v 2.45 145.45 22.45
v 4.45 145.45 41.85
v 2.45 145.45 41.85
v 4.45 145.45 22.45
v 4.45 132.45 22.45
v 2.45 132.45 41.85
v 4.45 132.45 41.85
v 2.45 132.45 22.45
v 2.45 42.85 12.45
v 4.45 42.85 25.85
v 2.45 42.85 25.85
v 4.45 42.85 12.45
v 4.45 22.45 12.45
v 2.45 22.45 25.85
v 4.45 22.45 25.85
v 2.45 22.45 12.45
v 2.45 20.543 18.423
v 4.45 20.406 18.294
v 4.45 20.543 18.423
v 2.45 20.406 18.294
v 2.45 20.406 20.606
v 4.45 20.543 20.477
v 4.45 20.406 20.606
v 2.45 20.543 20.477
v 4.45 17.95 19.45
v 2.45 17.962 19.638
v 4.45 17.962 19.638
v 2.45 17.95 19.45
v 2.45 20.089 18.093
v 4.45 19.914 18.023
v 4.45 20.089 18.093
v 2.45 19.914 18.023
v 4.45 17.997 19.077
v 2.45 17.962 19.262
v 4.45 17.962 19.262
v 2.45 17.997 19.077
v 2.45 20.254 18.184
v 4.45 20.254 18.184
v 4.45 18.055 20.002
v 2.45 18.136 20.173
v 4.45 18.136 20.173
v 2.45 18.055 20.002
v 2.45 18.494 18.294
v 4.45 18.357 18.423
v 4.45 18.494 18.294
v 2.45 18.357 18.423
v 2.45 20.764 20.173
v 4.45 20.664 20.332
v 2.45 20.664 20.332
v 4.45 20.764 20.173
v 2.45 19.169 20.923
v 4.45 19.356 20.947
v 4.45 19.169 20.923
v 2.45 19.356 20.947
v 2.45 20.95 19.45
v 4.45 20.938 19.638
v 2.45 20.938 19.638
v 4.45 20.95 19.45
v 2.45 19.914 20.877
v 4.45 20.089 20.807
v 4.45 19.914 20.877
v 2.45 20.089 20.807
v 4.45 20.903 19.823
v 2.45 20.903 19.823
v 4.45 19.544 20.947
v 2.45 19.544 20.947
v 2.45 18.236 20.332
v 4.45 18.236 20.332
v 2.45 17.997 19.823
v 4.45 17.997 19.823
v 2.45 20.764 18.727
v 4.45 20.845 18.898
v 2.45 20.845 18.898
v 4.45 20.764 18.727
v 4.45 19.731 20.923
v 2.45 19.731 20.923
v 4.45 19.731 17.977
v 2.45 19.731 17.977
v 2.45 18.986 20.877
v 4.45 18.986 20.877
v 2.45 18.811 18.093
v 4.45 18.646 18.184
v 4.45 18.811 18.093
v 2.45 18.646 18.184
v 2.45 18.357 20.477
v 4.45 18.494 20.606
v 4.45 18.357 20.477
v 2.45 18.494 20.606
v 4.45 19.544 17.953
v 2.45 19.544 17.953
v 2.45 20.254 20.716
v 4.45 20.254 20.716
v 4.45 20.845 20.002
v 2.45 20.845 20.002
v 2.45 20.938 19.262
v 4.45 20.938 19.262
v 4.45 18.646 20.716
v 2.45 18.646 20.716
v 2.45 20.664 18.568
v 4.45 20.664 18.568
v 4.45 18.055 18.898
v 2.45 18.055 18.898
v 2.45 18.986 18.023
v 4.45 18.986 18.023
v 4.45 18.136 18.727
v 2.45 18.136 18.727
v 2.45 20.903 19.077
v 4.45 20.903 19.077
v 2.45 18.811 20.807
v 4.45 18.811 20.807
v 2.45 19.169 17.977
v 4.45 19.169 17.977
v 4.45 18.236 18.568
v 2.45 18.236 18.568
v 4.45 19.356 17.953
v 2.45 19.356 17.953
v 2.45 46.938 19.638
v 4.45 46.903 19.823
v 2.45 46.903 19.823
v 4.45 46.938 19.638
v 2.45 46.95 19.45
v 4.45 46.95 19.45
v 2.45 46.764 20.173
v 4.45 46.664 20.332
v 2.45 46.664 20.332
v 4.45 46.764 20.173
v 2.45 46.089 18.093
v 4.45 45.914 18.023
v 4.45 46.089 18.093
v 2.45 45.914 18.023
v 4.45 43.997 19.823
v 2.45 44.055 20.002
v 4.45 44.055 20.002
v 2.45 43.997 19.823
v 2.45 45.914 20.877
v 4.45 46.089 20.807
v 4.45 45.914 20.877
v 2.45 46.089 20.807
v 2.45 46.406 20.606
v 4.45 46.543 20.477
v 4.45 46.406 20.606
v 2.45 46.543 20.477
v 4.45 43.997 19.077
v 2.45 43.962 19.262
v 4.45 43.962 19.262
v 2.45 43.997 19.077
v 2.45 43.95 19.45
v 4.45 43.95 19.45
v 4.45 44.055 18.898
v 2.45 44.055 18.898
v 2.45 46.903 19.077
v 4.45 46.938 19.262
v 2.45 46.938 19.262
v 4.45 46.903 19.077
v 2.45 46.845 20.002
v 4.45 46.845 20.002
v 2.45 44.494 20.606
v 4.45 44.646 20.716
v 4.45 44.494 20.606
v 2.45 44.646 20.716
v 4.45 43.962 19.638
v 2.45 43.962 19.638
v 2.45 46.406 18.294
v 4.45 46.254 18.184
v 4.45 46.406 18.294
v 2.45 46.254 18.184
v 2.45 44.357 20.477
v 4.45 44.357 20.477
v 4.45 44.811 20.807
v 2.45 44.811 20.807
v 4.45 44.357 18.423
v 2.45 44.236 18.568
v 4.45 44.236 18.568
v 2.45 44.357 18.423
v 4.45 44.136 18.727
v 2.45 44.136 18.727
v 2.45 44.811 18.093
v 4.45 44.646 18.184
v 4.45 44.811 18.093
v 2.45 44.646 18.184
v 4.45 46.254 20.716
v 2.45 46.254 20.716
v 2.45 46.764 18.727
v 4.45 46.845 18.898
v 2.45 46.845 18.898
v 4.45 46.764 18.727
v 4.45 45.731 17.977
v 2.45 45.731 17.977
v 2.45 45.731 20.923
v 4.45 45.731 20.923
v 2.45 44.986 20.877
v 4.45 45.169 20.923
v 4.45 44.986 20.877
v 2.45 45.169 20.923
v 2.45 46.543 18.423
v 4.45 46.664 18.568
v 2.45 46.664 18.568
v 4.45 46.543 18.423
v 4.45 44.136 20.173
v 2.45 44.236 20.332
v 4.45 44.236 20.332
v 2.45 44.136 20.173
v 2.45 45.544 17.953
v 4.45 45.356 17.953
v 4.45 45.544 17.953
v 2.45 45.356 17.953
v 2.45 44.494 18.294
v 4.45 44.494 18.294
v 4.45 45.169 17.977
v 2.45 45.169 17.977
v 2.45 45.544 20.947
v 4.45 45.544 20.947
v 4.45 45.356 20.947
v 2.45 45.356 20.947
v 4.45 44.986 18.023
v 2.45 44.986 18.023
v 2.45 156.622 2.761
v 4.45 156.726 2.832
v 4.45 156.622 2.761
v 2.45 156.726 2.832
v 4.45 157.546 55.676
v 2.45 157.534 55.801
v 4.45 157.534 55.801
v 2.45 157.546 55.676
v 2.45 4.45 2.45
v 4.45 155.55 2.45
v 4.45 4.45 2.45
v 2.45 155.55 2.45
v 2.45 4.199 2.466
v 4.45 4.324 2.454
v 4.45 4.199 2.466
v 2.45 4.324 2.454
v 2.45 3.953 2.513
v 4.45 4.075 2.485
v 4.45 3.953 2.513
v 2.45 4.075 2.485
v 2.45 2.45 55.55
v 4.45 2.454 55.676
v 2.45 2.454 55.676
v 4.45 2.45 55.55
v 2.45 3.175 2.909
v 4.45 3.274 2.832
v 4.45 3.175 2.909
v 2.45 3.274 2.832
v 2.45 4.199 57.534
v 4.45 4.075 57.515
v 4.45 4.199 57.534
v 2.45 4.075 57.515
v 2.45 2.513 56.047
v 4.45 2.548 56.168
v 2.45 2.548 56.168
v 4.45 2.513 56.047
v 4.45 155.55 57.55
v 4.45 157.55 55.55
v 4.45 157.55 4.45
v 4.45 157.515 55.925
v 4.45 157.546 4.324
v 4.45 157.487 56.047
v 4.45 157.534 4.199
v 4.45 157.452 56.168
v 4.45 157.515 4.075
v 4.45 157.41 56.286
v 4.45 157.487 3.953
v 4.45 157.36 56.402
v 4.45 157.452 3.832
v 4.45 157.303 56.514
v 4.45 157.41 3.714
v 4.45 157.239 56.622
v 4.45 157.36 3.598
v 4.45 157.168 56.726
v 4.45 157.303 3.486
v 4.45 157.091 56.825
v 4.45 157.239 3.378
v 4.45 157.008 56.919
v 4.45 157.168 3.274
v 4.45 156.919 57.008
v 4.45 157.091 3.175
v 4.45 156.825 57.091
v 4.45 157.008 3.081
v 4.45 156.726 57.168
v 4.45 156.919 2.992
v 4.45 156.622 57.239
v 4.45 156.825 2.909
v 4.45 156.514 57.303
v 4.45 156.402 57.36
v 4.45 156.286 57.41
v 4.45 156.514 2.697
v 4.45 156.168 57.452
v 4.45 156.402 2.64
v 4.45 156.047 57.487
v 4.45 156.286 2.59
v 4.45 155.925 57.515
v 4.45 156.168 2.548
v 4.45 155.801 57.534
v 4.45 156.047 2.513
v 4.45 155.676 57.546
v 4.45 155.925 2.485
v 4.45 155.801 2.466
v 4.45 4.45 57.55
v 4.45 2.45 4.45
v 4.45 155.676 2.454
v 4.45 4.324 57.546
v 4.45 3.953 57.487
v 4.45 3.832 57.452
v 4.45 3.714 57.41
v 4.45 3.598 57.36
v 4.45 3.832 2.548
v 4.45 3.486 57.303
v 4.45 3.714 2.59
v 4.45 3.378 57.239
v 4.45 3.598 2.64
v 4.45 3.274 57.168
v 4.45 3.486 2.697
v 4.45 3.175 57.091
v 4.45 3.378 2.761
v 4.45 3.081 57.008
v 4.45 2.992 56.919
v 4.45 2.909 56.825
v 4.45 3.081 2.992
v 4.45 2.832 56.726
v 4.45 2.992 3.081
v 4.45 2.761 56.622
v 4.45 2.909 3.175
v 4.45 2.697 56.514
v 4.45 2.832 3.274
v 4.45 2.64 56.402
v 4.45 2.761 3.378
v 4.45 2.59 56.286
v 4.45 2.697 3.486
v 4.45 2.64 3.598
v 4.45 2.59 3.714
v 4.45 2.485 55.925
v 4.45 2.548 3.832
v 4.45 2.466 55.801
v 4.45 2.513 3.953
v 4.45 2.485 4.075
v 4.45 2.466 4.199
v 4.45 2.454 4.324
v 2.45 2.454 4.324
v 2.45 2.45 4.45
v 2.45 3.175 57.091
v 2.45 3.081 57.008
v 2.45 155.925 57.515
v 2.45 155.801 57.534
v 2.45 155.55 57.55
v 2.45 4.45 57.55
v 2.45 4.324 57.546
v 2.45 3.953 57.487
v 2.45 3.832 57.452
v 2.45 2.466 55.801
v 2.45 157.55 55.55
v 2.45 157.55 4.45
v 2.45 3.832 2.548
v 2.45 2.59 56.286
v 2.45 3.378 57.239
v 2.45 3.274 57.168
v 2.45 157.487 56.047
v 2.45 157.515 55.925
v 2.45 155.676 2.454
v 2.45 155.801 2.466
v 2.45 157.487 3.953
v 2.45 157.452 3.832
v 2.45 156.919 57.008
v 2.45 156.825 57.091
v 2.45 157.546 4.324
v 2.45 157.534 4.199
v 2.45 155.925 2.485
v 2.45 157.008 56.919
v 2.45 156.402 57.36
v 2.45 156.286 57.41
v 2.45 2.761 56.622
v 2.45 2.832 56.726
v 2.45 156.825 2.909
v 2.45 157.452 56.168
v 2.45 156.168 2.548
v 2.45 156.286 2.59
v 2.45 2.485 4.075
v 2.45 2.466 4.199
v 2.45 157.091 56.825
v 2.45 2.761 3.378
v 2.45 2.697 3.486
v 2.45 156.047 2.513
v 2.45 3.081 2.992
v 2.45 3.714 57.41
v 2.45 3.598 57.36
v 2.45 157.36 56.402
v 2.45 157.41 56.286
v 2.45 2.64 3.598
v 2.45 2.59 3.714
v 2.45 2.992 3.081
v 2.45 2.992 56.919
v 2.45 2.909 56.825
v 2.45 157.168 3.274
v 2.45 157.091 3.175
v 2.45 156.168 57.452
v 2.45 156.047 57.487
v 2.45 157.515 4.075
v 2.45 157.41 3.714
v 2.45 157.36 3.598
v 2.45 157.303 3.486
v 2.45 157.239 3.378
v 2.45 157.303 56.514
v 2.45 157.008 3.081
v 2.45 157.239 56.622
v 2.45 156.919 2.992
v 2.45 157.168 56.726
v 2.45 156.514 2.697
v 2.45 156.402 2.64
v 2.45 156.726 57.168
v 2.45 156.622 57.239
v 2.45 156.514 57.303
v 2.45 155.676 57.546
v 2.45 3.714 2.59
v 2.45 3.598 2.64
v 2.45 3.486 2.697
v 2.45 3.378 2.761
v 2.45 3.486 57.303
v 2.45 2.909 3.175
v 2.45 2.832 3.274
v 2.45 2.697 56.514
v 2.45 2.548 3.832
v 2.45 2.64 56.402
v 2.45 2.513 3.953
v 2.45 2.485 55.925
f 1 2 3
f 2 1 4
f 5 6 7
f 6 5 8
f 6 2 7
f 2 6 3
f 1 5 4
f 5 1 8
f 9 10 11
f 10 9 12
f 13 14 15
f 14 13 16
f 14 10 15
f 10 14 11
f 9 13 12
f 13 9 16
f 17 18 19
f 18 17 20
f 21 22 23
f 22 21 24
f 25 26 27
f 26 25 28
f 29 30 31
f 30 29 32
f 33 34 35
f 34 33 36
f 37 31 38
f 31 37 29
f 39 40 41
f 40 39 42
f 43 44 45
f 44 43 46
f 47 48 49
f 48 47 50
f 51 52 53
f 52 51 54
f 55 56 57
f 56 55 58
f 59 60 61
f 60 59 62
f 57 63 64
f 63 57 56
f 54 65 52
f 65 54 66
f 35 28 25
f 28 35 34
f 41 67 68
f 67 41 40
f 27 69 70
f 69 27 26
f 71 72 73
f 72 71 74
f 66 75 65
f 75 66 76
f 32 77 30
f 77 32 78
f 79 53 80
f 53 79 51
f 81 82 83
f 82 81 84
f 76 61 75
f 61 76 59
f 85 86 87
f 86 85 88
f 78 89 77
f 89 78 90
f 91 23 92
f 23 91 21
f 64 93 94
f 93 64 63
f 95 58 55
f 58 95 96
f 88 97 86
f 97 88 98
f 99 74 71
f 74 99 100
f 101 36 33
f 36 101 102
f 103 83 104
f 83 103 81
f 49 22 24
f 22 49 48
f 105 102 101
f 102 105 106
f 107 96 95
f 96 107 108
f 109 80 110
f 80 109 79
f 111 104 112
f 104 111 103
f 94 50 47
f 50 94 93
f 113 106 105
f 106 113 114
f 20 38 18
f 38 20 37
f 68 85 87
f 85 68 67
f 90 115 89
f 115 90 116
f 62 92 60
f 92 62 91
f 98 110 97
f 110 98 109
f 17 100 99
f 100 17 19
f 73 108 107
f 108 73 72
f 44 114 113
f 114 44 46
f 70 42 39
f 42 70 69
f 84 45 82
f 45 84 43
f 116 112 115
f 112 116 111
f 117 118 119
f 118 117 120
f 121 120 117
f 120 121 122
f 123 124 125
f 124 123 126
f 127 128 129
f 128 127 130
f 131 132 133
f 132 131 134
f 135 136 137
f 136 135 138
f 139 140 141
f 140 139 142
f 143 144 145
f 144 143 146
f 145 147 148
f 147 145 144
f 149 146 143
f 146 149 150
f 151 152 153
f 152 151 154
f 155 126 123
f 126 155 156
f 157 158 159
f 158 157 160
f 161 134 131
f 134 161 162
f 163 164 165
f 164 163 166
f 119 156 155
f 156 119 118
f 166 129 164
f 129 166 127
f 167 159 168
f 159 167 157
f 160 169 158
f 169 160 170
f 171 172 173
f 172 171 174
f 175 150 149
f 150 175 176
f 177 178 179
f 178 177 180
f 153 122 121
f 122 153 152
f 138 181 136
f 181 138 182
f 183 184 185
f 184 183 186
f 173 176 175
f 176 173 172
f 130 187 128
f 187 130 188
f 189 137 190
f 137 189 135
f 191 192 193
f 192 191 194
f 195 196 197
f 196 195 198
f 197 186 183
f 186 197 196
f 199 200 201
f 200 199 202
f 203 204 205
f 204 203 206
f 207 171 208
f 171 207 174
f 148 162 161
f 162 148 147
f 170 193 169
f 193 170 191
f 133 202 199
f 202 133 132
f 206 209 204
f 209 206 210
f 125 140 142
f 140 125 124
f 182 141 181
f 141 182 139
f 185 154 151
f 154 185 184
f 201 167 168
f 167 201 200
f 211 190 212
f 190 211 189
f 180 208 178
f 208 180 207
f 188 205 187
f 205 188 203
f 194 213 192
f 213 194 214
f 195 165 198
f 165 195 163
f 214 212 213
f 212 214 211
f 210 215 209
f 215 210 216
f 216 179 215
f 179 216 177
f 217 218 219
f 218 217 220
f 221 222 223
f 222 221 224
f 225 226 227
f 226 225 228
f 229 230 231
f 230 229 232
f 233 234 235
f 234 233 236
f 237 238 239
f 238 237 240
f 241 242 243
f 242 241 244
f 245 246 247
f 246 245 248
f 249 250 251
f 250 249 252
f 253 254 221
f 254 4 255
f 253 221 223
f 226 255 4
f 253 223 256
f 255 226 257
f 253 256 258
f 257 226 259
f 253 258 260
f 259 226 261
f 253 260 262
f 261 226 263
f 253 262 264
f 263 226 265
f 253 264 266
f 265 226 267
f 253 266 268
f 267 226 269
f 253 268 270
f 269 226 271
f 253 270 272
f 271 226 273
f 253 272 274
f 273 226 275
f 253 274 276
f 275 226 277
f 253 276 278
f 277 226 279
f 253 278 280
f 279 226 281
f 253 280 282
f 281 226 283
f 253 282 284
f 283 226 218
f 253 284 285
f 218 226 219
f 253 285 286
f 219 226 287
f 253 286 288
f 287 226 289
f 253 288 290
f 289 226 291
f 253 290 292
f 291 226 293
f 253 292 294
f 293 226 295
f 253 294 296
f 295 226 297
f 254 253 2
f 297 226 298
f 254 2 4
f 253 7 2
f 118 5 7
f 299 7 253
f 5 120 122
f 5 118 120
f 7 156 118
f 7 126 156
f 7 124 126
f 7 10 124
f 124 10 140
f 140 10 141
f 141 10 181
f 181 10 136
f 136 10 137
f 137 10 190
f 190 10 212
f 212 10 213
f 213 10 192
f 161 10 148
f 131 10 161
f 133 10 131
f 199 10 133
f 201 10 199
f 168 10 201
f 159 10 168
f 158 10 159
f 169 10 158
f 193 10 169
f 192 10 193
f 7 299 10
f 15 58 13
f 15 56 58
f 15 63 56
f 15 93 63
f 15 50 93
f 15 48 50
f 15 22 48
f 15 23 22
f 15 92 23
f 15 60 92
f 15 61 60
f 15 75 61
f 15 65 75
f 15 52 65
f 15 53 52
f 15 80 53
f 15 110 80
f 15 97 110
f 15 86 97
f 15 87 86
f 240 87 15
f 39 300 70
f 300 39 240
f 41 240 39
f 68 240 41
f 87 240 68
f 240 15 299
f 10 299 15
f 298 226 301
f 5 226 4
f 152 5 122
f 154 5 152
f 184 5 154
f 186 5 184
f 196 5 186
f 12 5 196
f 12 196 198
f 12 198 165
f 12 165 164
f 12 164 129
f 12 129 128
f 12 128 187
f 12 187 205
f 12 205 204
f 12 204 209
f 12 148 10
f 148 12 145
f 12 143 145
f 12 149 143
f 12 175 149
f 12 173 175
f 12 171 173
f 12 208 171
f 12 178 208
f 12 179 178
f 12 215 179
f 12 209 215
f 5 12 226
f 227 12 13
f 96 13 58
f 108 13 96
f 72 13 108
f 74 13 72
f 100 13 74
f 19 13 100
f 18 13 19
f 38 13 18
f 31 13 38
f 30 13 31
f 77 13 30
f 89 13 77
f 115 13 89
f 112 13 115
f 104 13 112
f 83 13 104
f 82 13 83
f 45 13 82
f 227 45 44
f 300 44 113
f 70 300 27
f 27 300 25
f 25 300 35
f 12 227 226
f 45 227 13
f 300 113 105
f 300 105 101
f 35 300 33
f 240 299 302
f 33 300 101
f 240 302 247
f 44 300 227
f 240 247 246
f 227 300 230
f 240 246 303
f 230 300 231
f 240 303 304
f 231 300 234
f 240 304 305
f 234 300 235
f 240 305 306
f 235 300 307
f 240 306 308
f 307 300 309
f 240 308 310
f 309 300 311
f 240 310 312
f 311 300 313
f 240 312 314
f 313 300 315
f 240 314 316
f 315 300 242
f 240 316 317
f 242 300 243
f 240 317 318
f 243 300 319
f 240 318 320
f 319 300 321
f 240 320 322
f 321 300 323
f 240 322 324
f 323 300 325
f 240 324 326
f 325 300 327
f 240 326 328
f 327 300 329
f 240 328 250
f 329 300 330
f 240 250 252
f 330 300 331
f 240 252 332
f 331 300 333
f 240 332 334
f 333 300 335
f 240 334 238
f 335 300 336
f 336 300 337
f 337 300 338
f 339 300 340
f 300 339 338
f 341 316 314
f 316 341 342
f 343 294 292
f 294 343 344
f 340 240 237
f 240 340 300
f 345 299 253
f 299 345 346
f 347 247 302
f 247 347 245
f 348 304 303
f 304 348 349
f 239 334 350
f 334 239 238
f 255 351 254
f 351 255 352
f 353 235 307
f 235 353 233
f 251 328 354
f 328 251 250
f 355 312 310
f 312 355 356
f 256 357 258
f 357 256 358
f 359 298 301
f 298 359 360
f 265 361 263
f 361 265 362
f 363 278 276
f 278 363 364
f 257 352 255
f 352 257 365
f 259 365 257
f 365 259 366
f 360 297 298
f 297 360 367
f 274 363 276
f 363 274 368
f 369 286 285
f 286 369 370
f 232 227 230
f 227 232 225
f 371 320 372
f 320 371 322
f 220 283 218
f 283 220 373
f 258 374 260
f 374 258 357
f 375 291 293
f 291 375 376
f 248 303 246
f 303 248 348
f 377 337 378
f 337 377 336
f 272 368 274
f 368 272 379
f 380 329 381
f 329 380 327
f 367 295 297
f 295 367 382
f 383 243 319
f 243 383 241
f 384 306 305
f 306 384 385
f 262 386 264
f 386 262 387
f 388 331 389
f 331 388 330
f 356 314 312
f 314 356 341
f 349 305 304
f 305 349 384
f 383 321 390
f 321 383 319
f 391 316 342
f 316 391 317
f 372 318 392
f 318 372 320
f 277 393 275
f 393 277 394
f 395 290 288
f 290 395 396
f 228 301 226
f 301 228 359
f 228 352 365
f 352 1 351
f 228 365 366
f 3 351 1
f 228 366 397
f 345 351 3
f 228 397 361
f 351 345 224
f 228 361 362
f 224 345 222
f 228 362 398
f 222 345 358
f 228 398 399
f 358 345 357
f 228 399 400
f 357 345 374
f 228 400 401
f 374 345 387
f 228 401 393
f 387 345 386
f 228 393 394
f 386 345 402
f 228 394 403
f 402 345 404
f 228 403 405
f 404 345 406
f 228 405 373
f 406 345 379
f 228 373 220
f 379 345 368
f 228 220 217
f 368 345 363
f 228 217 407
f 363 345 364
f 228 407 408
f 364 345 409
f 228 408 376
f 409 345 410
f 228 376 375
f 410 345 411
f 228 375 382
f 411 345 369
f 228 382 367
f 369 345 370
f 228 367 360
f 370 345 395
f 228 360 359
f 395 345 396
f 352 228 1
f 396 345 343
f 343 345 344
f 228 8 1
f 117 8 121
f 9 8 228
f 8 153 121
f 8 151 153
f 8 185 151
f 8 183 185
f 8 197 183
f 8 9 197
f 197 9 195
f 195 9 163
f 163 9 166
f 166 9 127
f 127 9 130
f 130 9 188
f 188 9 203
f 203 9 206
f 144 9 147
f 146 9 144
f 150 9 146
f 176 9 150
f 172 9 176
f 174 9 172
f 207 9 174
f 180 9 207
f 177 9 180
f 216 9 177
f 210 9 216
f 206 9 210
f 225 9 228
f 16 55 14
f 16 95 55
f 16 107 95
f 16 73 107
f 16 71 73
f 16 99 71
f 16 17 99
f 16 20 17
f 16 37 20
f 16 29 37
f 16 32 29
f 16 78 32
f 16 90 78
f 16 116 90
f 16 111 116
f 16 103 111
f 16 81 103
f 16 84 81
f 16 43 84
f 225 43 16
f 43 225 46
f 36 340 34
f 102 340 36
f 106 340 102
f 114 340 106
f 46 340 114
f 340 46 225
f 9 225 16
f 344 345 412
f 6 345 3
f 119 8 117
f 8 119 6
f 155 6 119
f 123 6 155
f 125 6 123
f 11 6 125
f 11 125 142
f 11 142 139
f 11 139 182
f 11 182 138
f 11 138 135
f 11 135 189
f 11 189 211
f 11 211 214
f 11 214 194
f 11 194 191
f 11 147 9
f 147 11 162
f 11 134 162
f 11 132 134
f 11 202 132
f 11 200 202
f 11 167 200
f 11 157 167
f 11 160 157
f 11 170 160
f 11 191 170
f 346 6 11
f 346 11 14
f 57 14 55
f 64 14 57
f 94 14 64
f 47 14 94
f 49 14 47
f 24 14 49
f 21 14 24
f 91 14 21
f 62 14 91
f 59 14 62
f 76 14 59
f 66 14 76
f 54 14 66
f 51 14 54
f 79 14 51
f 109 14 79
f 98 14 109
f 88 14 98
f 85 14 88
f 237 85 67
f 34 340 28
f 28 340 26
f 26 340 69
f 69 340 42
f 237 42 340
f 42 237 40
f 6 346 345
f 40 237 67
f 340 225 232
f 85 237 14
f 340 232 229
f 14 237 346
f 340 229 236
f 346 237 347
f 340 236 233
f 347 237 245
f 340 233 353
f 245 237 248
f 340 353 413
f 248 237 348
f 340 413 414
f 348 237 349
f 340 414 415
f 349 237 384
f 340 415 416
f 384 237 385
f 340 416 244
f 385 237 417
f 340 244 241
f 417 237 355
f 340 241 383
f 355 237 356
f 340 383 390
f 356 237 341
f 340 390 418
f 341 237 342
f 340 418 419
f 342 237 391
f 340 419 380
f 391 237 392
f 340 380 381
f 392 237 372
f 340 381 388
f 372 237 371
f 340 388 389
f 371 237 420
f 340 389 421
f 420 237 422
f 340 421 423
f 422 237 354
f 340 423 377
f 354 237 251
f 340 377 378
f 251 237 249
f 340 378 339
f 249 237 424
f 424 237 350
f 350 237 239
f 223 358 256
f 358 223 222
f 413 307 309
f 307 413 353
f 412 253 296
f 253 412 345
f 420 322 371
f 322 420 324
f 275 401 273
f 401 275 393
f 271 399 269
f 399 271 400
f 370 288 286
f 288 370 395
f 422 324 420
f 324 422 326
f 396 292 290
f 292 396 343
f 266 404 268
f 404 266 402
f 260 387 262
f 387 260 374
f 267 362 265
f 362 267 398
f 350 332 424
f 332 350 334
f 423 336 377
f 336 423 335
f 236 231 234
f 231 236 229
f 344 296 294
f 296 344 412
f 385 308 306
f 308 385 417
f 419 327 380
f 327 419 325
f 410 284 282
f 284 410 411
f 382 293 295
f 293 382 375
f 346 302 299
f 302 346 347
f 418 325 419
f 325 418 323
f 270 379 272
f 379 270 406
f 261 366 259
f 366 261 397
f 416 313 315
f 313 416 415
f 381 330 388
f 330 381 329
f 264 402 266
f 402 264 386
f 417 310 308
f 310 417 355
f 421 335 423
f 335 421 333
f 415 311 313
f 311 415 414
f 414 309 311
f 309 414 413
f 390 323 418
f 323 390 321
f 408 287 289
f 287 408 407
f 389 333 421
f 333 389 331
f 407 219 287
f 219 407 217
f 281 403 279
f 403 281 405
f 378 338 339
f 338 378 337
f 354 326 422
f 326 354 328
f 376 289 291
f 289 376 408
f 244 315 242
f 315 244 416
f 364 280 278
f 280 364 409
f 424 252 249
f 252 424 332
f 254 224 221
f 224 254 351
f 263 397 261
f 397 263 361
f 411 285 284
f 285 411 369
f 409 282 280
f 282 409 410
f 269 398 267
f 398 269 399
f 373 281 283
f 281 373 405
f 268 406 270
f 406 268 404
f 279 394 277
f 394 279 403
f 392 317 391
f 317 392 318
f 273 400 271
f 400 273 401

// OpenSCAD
/*//////////////////////////////////////////////////////////////////
              -    FB Aka Heartman/Hearty 2016     -                   
              -   http://heartygfx.blogspot.com    -                  
              -       OpenScad Parametric Box      -                     
              -         CC BY-NC 3.0 License       -                      
////////////////////////////////////////////////////////////////////                                                                                                             
12/02/2016 - Fixed minor bug 
28/02/2016 - Added holes ventilation option                    
09/03/2016 - Added PCB feet support, fixed the shell artefact on export mode. 

*/////////////////////////// - Info - //////////////////////////////

// All coordinates are starting as integrated circuit pins.
// From the top view :

//   CoordD           <---       CoordC
//                                 ^
//                                 ^
//                                 ^
//   CoordA           --->       CoordB


////////////////////////////////////////////////////////////////////


////////// - Paramètres de la boite - Box parameters - /////////////

/* [Box dimensions] */
// - Longueur - Length  
  Length        = 140;       
// - Largeur - Width
  Width         = 160;                     
// - Hauteur - Height  
  Height        = 60;  
// - Epaisseur - Wall thickness  
  Thick         = 2;//[2:5]  
  
/* [Box options] */
// - Diamètre Coin arrondi - Filet diameter  
  Filet         = 2;//[0.1:12] 
// - lissage de l'arrondi - Filet smoothness  
  Resolution    = 50;//[1:100] 
// - Tolérance - Tolerance (Panel/rails gap)
  m             = 0.9;
// Pieds PCB - PCB feet (x4) 
  PCBFeet       = 0;// [0:No, 1:Yes]
// - Decorations to ventilation holes
  Vent          = 1;// [0:No, 1:Yes]
// - Decoration-Holes width (in mm)
  Vent_width    = 1.5;   


  
/* [PCB_Feet] */
//All dimensions are from the center foot axis

// - Coin bas gauche - Low left corner X position
PCBPosX         = 5;
// - Coin bas gauche - Low left corner Y position
PCBPosY         = 5;
// - Longueur PCB - PCB Length
PCBLength       = 105;
// - Largeur PCB - PCB Width
PCBWidth        = 125;
// - Heuteur pied - Feet height
FootHeight      = 10;
// - Diamètre pied - Foot diameter
FootDia         = 8;
// - Diamètre trou - Hole diameter
FootHole        = 3;  
  

/* [STL element to export] */
//Coque haut - Top shell
TShell          = 0;// [0:No, 1:Yes]
//Coque bas- Bottom shell
BShell          = 0;// [0:No, 1:Yes]
//Panneau avant - Front panel
FPanL           = 0;// [0:No, 1:Yes]
//Panneau arrière - Back panel  
BPanL           = 1;// [0:No, 1:Yes]


  
/* [Hidden] */
// - Couleur coque - Shell color  
Couleur1        = "Orange";       
// - Couleur panneaux - Panels color    
Couleur2        = "OrangeRed";    
// Thick X 2 - making decorations thicker if it is a vent to make sure they go through shell
Dec_Thick       = Vent ? Thick*2 : Thick; 
// - Depth decoration
Dec_size        = Vent ? Thick*2 : 0.8;





/////////// - Boitier générique bord arrondis - Generic rounded box - //////////

module RoundBox($a=Length, $b=Width, $c=Height){// Cube bords arrondis
                    $fn=Resolution;            
                    translate([0,Filet,Filet]){  
                    minkowski (){                                              
                        cube ([$a-(Length/2),$b-(2*Filet),$c-(2*Filet)], center = false);
                        rotate([0,90,0]){    
                        cylinder(r=Filet,h=Length/2, center = false);
                            } 
                        }
                    }
                }// End of RoundBox Module

      
////////////////////////////////// - Module Coque/Shell - //////////////////////////////////         

module Coque(){//Coque - Shell  
    Thick = Thick*2;  
    difference(){    
        difference(){//sides decoration
            union(){    
                     difference() {//soustraction de la forme centrale - Substraction Fileted box
                      
                        difference(){//soustraction cube median - Median cube slicer
                            union() {//union               
                            difference(){//Coque    
                                RoundBox();
                                translate([Thick/2,Thick/2,Thick/2]){     
                                        RoundBox($a=Length-Thick, $b=Width-Thick, $c=Height-Thick);
                                        }
                                        }//Fin diff Coque                            
                                difference(){//largeur Rails        
                                     translate([Thick+m,Thick/2,Thick/2]){// Rails
                                          RoundBox($a=Length-((2*Thick)+(2*m)), $b=Width-Thick, $c=Height-(Thick*2));
                                                          }//fin Rails
                                     translate([((Thick+m/2)*1.55),Thick/2,Thick/2+0.1]){ // +0.1 added to avoid the artefact
                                          RoundBox($a=Length-((Thick*3)+2*m), $b=Width-Thick, $c=Height-Thick);
                                                    }           
                                                }//Fin largeur Rails
                                    }//Fin union                                   
                               translate([-Thick,-Thick,Height/2]){// Cube à soustraire
                                    cube ([Length+100, Width+100, Height], center=false);
                                            }                                            
                                      }//fin soustraction cube median - End Median cube slicer
                               translate([-Thick/2,Thick,Thick]){// Forme de soustraction centrale 
                                    RoundBox($a=Length+Thick, $b=Width-Thick*2, $c=Height-Thick);       
                                    }                          
                                }                                          


                difference(){// wall fixation box legs
                    union(){
                        translate([3*Thick +5,Thick,Height/2]){
                            rotate([90,0,0]){
                                    $fn=6;
                                    cylinder(d=16,Thick/2);
                                    }   
                            }
                            
                       translate([Length-((3*Thick)+5),Thick,Height/2]){
                            rotate([90,0,0]){
                                    $fn=6;
                                    cylinder(d=16,Thick/2);
                                    }   
                            }

                        }
                            translate([4,Thick+Filet,Height/2-57]){   
                             rotate([45,0,0]){
                                   cube([Length,40,40]);    
                                  }
                           }
                           translate([0,-(Thick*1.46),Height/2]){
                                cube([Length,Thick*2,10]);
                           }
                    } //Fin fixation box legs
            }

        union(){// outbox sides decorations
            
            for(i=[0:Thick:Length/4]){

                // Ventilation holes part code submitted by Ettie - Thanks ;) 
                    translate([10+i,-Dec_Thick+Dec_size,1]){
                    cube([Vent_width,Dec_Thick,Height/4]);
                    }
                    translate([(Length-10) - i,-Dec_Thick+Dec_size,1]){
                    cube([Vent_width,Dec_Thick,Height/4]);
                    }
                    translate([(Length-10) - i,Width-Dec_size,1]){
                    cube([Vent_width,Dec_Thick,Height/4]);
                    }
                    translate([10+i,Width-Dec_size,1]){
                    cube([Vent_width,Dec_Thick,Height/4]);
                    }
  
                
                    }// fin de for
               // }
                }//fin union decoration
            }//fin difference decoration


            union(){ //sides holes
                $fn=50;
                translate([3*Thick+5,20,Height/2+4]){
                    rotate([90,0,0]){
                    cylinder(d=2,20);
                    }
                }
                translate([Length-((3*Thick)+5),20,Height/2+4]){
                    rotate([90,0,0]){
                    cylinder(d=2,20);
                    }
                }
                translate([3*Thick+5,Width+5,Height/2-4]){
                    rotate([90,0,0]){
                    cylinder(d=2,20);
                    }
                }
                translate([Length-((3*Thick)+5),Width+5,Height/2-4]){
                    rotate([90,0,0]){
                    cylinder(d=2,20);
                    }
                }
            }//fin de sides holes

        }//fin de difference holes
}// fin coque 

////////////////////////////// - Experiment - ///////////////////////////////////////////





/////////////////////// - Foot with base filet - /////////////////////////////
module foot(FootDia,FootHole,FootHeight){
    Filet=2;
    color(Couleur1)   
    translate([0,0,Filet-1.5])
    difference(){
    
    difference(){
            //translate ([0,0,-Thick]){
                cylinder(d=FootDia+Filet,FootHeight-Thick, $fn=100);
                        //}
                    rotate_extrude($fn=100){
                            translate([(FootDia+Filet*2)/2,Filet,0]){
                                    minkowski(){
                                            square(10);
                                            circle(Filet, $fn=100);
                                        }
                                 }
                           }
                   }
            cylinder(d=FootHole,FootHeight+1, $fn=100);
               }          
}// Fin module foot
  
module Feet(){     
//////////////////// - PCB only visible in the preview mode - /////////////////////    
    translate([3*Thick+2,Thick+5,FootHeight+(Thick/2)-0.5]){
    
    %square ([PCBLength+10,PCBWidth+10]);
       translate([PCBLength/2,PCBWidth/2,0.5]){ 
        color("Olive")
        %text("PCB", halign="center", valign="center", font="Arial black");
       }
    } // Fin PCB 
  
    
////////////////////////////// - 4 Feet - //////////////////////////////////////////     
    translate([3*Thick+7,Thick+10,Thick/2]){
        foot(FootDia,FootHole,FootHeight);
    }
    translate([(3*Thick)+PCBLength+7,Thick+10,Thick/2]){
        foot(FootDia,FootHole,FootHeight);
        }
    translate([(3*Thick)+PCBLength+7,(Thick)+PCBWidth+10,Thick/2]){
        foot(FootDia,FootHole,FootHeight);
        }        
    translate([3*Thick+7,(Thick)+PCBWidth+10,Thick/2]){
        foot(FootDia,FootHole,FootHeight);
    }   

} // Fin du module Feet
 


 
 ////////////////////////////////////////////////////////////////////////
////////////////////// <- Holes Panel Manager -> ///////////////////////
////////////////////////////////////////////////////////////////////////

//                           <- Panel ->  
module Panel(Length,Width,Thick,Filet){
    scale([0.5,1,1])
    minkowski(){
            cube([Thick,Width-(Thick*2+Filet*2+m),Height-(Thick*2+Filet*2+m)]);
            translate([0,Filet,Filet])
            rotate([0,90,0])
            cylinder(r=Filet,h=Thick, $fn=100);
      }
}



//                          <- Circle hole -> 
// Cx=Cylinder X position | Cy=Cylinder Y position | Cdia= Cylinder dia | Cheight=Cyl height
module CylinderHole(OnOff,Cx,Cy,Cdia){
    if(OnOff==1)
    translate([Cx,Cy,-1])
        cylinder(d=Cdia,10, $fn=50);
}
//                          <- Square hole ->  
// Sx=Square X position | Sy=Square Y position | Sl= Square Length | Sw=Square Width | Filet = Round corner
module SquareHole(OnOff,Sx,Sy,Sl,Sw,Filet){
    if(OnOff==1)
     minkowski(){
        translate([Sx+Filet/2,Sy+Filet/2,-1])
            cube([Sl-Filet,Sw-Filet,10]);
            cylinder(d=Filet,h=10, $fn=100);
       }
}


 
//                      <- Linear text panel -> 
module LText(OnOff,Tx,Ty,Font,Size,Content){
    if(OnOff==1)
    translate([Tx,Ty,Thick+.5])
    linear_extrude(height = 0.5){
    text(Content, size=Size, font=Font);
    }
}
//                     <- Circular text panel->  
module CText(OnOff,Tx,Ty,Font,Size,TxtRadius,Angl,Turn,Content){ 
      if(OnOff==1) {
      Angle = -Angl / len(Content);
      translate([Tx,Ty,Thick+.5])
          for (i= [0:len(Content)-1] ){   
              rotate([0,0,i*Angle+90+Turn])
              translate([0,TxtRadius,0]) {
                linear_extrude(height = 0.5){
                text(Content[i], font = Font, size = Size,  valign ="baseline", halign ="center");
                    }
                }   
             }
      }
}
////////////////////// <- New module Panel -> //////////////////////
module FPanL(){
    difference(){
        color(Couleur2)
        Panel(Length,Width,Thick,Filet);
    
 
    rotate([90,0,90]){
        color(Couleur2){
//                     <- Cutting shapes from here ->  
//        SquareHole  (1,20,20,15,10,1); //(On/Off, Xpos,Ypos,Length,Width,Filet)
//        SquareHole  (1,40,20,15,10,1);
//        SquareHole  (1,60,20,15,10,1); 
//        CylinderHole(1,27,40,8);       //(On/Off, Xpos, Ypos, Diameter)
//        CylinderHole(1,47,40,8);
//        CylinderHole(1,67,40,8);
//        SquareHole  (1,20,50,80,30,3);
//        CylinderHole(1,93,30,10);
//        SquareHole  (1,120,20,30,60,3);
//                            <- To here -> 
           }
       }
}

    color(Couleur1){
        translate ([-.5,0,0])
        rotate([90,0,90]){
//                      <- Adding text from here ->          
//        LText(1,20,83,"Arial Black",4,"Digital Screen");//(On/Off, Xpos, Ypos, "Font", Size, "Text")
//        LText(1,120,83,"Arial Black",4,"Level");
//        LText(1,20,11,"Arial Black",6,"  1     2      3");
//        CText(1,93,29,"Arial Black",4,10,180,0,"1 . 2 . 3 . 4 . 5 . 6");//(On/Off, Xpos, Ypos, "Font", Size, Diameter, Arc(Deg), Starting Angle(Deg),"Text")
//                            <- To here ->
            }
      }
}

module BPanL(){
    difference(){
        color(Couleur2)
        Panel(Length,Width,Thick,Filet);
    
 
    rotate([90,0,90]){
        color(Couleur2){
//                     <- Cutting shapes from here ->  
          SquareHole  (1,130,20,13,19.4,0); // выключатель
          SquareHole  (1,20,10,20.4,13.4,0); // гнездо питания
          CylinderHole(1,17,17,3);
          CylinderHole(1,43,17,3);
//                            <- To here -> 
           }
       }
    }

}


/////////////////////////// <- Main part -> /////////////////////////

if(TShell==1)
// Coque haut - Top Shell
        color( Couleur1,1){
            translate([0,Width,Height+0.2]){
                rotate([0,180,180]){
                        Coque();
                        }
                }
        }

if(BShell==1)
// Coque bas - Bottom shell
        color(Couleur1){ 
        Coque();
        }

// Pied support PCB - PCB feet
if (PCBFeet==1)
// Feet
        translate([PCBPosX,PCBPosY,0]){ 
        Feet();
        }

// Panneau avant - Front panel  <<<<<< Text and holes only on this one.
//rotate([0,-90,-90]) 
if(FPanL==1)
        translate([Length-(Thick*2+m/2),Thick+m/2,Thick+m/2])
        FPanL();

//Panneau arrière - Back panel
if(BPanL==1)
        color(Couleur2)
        translate([Thick+m/2,Thick+m/2,Thick+m/2])
        BPanL();
